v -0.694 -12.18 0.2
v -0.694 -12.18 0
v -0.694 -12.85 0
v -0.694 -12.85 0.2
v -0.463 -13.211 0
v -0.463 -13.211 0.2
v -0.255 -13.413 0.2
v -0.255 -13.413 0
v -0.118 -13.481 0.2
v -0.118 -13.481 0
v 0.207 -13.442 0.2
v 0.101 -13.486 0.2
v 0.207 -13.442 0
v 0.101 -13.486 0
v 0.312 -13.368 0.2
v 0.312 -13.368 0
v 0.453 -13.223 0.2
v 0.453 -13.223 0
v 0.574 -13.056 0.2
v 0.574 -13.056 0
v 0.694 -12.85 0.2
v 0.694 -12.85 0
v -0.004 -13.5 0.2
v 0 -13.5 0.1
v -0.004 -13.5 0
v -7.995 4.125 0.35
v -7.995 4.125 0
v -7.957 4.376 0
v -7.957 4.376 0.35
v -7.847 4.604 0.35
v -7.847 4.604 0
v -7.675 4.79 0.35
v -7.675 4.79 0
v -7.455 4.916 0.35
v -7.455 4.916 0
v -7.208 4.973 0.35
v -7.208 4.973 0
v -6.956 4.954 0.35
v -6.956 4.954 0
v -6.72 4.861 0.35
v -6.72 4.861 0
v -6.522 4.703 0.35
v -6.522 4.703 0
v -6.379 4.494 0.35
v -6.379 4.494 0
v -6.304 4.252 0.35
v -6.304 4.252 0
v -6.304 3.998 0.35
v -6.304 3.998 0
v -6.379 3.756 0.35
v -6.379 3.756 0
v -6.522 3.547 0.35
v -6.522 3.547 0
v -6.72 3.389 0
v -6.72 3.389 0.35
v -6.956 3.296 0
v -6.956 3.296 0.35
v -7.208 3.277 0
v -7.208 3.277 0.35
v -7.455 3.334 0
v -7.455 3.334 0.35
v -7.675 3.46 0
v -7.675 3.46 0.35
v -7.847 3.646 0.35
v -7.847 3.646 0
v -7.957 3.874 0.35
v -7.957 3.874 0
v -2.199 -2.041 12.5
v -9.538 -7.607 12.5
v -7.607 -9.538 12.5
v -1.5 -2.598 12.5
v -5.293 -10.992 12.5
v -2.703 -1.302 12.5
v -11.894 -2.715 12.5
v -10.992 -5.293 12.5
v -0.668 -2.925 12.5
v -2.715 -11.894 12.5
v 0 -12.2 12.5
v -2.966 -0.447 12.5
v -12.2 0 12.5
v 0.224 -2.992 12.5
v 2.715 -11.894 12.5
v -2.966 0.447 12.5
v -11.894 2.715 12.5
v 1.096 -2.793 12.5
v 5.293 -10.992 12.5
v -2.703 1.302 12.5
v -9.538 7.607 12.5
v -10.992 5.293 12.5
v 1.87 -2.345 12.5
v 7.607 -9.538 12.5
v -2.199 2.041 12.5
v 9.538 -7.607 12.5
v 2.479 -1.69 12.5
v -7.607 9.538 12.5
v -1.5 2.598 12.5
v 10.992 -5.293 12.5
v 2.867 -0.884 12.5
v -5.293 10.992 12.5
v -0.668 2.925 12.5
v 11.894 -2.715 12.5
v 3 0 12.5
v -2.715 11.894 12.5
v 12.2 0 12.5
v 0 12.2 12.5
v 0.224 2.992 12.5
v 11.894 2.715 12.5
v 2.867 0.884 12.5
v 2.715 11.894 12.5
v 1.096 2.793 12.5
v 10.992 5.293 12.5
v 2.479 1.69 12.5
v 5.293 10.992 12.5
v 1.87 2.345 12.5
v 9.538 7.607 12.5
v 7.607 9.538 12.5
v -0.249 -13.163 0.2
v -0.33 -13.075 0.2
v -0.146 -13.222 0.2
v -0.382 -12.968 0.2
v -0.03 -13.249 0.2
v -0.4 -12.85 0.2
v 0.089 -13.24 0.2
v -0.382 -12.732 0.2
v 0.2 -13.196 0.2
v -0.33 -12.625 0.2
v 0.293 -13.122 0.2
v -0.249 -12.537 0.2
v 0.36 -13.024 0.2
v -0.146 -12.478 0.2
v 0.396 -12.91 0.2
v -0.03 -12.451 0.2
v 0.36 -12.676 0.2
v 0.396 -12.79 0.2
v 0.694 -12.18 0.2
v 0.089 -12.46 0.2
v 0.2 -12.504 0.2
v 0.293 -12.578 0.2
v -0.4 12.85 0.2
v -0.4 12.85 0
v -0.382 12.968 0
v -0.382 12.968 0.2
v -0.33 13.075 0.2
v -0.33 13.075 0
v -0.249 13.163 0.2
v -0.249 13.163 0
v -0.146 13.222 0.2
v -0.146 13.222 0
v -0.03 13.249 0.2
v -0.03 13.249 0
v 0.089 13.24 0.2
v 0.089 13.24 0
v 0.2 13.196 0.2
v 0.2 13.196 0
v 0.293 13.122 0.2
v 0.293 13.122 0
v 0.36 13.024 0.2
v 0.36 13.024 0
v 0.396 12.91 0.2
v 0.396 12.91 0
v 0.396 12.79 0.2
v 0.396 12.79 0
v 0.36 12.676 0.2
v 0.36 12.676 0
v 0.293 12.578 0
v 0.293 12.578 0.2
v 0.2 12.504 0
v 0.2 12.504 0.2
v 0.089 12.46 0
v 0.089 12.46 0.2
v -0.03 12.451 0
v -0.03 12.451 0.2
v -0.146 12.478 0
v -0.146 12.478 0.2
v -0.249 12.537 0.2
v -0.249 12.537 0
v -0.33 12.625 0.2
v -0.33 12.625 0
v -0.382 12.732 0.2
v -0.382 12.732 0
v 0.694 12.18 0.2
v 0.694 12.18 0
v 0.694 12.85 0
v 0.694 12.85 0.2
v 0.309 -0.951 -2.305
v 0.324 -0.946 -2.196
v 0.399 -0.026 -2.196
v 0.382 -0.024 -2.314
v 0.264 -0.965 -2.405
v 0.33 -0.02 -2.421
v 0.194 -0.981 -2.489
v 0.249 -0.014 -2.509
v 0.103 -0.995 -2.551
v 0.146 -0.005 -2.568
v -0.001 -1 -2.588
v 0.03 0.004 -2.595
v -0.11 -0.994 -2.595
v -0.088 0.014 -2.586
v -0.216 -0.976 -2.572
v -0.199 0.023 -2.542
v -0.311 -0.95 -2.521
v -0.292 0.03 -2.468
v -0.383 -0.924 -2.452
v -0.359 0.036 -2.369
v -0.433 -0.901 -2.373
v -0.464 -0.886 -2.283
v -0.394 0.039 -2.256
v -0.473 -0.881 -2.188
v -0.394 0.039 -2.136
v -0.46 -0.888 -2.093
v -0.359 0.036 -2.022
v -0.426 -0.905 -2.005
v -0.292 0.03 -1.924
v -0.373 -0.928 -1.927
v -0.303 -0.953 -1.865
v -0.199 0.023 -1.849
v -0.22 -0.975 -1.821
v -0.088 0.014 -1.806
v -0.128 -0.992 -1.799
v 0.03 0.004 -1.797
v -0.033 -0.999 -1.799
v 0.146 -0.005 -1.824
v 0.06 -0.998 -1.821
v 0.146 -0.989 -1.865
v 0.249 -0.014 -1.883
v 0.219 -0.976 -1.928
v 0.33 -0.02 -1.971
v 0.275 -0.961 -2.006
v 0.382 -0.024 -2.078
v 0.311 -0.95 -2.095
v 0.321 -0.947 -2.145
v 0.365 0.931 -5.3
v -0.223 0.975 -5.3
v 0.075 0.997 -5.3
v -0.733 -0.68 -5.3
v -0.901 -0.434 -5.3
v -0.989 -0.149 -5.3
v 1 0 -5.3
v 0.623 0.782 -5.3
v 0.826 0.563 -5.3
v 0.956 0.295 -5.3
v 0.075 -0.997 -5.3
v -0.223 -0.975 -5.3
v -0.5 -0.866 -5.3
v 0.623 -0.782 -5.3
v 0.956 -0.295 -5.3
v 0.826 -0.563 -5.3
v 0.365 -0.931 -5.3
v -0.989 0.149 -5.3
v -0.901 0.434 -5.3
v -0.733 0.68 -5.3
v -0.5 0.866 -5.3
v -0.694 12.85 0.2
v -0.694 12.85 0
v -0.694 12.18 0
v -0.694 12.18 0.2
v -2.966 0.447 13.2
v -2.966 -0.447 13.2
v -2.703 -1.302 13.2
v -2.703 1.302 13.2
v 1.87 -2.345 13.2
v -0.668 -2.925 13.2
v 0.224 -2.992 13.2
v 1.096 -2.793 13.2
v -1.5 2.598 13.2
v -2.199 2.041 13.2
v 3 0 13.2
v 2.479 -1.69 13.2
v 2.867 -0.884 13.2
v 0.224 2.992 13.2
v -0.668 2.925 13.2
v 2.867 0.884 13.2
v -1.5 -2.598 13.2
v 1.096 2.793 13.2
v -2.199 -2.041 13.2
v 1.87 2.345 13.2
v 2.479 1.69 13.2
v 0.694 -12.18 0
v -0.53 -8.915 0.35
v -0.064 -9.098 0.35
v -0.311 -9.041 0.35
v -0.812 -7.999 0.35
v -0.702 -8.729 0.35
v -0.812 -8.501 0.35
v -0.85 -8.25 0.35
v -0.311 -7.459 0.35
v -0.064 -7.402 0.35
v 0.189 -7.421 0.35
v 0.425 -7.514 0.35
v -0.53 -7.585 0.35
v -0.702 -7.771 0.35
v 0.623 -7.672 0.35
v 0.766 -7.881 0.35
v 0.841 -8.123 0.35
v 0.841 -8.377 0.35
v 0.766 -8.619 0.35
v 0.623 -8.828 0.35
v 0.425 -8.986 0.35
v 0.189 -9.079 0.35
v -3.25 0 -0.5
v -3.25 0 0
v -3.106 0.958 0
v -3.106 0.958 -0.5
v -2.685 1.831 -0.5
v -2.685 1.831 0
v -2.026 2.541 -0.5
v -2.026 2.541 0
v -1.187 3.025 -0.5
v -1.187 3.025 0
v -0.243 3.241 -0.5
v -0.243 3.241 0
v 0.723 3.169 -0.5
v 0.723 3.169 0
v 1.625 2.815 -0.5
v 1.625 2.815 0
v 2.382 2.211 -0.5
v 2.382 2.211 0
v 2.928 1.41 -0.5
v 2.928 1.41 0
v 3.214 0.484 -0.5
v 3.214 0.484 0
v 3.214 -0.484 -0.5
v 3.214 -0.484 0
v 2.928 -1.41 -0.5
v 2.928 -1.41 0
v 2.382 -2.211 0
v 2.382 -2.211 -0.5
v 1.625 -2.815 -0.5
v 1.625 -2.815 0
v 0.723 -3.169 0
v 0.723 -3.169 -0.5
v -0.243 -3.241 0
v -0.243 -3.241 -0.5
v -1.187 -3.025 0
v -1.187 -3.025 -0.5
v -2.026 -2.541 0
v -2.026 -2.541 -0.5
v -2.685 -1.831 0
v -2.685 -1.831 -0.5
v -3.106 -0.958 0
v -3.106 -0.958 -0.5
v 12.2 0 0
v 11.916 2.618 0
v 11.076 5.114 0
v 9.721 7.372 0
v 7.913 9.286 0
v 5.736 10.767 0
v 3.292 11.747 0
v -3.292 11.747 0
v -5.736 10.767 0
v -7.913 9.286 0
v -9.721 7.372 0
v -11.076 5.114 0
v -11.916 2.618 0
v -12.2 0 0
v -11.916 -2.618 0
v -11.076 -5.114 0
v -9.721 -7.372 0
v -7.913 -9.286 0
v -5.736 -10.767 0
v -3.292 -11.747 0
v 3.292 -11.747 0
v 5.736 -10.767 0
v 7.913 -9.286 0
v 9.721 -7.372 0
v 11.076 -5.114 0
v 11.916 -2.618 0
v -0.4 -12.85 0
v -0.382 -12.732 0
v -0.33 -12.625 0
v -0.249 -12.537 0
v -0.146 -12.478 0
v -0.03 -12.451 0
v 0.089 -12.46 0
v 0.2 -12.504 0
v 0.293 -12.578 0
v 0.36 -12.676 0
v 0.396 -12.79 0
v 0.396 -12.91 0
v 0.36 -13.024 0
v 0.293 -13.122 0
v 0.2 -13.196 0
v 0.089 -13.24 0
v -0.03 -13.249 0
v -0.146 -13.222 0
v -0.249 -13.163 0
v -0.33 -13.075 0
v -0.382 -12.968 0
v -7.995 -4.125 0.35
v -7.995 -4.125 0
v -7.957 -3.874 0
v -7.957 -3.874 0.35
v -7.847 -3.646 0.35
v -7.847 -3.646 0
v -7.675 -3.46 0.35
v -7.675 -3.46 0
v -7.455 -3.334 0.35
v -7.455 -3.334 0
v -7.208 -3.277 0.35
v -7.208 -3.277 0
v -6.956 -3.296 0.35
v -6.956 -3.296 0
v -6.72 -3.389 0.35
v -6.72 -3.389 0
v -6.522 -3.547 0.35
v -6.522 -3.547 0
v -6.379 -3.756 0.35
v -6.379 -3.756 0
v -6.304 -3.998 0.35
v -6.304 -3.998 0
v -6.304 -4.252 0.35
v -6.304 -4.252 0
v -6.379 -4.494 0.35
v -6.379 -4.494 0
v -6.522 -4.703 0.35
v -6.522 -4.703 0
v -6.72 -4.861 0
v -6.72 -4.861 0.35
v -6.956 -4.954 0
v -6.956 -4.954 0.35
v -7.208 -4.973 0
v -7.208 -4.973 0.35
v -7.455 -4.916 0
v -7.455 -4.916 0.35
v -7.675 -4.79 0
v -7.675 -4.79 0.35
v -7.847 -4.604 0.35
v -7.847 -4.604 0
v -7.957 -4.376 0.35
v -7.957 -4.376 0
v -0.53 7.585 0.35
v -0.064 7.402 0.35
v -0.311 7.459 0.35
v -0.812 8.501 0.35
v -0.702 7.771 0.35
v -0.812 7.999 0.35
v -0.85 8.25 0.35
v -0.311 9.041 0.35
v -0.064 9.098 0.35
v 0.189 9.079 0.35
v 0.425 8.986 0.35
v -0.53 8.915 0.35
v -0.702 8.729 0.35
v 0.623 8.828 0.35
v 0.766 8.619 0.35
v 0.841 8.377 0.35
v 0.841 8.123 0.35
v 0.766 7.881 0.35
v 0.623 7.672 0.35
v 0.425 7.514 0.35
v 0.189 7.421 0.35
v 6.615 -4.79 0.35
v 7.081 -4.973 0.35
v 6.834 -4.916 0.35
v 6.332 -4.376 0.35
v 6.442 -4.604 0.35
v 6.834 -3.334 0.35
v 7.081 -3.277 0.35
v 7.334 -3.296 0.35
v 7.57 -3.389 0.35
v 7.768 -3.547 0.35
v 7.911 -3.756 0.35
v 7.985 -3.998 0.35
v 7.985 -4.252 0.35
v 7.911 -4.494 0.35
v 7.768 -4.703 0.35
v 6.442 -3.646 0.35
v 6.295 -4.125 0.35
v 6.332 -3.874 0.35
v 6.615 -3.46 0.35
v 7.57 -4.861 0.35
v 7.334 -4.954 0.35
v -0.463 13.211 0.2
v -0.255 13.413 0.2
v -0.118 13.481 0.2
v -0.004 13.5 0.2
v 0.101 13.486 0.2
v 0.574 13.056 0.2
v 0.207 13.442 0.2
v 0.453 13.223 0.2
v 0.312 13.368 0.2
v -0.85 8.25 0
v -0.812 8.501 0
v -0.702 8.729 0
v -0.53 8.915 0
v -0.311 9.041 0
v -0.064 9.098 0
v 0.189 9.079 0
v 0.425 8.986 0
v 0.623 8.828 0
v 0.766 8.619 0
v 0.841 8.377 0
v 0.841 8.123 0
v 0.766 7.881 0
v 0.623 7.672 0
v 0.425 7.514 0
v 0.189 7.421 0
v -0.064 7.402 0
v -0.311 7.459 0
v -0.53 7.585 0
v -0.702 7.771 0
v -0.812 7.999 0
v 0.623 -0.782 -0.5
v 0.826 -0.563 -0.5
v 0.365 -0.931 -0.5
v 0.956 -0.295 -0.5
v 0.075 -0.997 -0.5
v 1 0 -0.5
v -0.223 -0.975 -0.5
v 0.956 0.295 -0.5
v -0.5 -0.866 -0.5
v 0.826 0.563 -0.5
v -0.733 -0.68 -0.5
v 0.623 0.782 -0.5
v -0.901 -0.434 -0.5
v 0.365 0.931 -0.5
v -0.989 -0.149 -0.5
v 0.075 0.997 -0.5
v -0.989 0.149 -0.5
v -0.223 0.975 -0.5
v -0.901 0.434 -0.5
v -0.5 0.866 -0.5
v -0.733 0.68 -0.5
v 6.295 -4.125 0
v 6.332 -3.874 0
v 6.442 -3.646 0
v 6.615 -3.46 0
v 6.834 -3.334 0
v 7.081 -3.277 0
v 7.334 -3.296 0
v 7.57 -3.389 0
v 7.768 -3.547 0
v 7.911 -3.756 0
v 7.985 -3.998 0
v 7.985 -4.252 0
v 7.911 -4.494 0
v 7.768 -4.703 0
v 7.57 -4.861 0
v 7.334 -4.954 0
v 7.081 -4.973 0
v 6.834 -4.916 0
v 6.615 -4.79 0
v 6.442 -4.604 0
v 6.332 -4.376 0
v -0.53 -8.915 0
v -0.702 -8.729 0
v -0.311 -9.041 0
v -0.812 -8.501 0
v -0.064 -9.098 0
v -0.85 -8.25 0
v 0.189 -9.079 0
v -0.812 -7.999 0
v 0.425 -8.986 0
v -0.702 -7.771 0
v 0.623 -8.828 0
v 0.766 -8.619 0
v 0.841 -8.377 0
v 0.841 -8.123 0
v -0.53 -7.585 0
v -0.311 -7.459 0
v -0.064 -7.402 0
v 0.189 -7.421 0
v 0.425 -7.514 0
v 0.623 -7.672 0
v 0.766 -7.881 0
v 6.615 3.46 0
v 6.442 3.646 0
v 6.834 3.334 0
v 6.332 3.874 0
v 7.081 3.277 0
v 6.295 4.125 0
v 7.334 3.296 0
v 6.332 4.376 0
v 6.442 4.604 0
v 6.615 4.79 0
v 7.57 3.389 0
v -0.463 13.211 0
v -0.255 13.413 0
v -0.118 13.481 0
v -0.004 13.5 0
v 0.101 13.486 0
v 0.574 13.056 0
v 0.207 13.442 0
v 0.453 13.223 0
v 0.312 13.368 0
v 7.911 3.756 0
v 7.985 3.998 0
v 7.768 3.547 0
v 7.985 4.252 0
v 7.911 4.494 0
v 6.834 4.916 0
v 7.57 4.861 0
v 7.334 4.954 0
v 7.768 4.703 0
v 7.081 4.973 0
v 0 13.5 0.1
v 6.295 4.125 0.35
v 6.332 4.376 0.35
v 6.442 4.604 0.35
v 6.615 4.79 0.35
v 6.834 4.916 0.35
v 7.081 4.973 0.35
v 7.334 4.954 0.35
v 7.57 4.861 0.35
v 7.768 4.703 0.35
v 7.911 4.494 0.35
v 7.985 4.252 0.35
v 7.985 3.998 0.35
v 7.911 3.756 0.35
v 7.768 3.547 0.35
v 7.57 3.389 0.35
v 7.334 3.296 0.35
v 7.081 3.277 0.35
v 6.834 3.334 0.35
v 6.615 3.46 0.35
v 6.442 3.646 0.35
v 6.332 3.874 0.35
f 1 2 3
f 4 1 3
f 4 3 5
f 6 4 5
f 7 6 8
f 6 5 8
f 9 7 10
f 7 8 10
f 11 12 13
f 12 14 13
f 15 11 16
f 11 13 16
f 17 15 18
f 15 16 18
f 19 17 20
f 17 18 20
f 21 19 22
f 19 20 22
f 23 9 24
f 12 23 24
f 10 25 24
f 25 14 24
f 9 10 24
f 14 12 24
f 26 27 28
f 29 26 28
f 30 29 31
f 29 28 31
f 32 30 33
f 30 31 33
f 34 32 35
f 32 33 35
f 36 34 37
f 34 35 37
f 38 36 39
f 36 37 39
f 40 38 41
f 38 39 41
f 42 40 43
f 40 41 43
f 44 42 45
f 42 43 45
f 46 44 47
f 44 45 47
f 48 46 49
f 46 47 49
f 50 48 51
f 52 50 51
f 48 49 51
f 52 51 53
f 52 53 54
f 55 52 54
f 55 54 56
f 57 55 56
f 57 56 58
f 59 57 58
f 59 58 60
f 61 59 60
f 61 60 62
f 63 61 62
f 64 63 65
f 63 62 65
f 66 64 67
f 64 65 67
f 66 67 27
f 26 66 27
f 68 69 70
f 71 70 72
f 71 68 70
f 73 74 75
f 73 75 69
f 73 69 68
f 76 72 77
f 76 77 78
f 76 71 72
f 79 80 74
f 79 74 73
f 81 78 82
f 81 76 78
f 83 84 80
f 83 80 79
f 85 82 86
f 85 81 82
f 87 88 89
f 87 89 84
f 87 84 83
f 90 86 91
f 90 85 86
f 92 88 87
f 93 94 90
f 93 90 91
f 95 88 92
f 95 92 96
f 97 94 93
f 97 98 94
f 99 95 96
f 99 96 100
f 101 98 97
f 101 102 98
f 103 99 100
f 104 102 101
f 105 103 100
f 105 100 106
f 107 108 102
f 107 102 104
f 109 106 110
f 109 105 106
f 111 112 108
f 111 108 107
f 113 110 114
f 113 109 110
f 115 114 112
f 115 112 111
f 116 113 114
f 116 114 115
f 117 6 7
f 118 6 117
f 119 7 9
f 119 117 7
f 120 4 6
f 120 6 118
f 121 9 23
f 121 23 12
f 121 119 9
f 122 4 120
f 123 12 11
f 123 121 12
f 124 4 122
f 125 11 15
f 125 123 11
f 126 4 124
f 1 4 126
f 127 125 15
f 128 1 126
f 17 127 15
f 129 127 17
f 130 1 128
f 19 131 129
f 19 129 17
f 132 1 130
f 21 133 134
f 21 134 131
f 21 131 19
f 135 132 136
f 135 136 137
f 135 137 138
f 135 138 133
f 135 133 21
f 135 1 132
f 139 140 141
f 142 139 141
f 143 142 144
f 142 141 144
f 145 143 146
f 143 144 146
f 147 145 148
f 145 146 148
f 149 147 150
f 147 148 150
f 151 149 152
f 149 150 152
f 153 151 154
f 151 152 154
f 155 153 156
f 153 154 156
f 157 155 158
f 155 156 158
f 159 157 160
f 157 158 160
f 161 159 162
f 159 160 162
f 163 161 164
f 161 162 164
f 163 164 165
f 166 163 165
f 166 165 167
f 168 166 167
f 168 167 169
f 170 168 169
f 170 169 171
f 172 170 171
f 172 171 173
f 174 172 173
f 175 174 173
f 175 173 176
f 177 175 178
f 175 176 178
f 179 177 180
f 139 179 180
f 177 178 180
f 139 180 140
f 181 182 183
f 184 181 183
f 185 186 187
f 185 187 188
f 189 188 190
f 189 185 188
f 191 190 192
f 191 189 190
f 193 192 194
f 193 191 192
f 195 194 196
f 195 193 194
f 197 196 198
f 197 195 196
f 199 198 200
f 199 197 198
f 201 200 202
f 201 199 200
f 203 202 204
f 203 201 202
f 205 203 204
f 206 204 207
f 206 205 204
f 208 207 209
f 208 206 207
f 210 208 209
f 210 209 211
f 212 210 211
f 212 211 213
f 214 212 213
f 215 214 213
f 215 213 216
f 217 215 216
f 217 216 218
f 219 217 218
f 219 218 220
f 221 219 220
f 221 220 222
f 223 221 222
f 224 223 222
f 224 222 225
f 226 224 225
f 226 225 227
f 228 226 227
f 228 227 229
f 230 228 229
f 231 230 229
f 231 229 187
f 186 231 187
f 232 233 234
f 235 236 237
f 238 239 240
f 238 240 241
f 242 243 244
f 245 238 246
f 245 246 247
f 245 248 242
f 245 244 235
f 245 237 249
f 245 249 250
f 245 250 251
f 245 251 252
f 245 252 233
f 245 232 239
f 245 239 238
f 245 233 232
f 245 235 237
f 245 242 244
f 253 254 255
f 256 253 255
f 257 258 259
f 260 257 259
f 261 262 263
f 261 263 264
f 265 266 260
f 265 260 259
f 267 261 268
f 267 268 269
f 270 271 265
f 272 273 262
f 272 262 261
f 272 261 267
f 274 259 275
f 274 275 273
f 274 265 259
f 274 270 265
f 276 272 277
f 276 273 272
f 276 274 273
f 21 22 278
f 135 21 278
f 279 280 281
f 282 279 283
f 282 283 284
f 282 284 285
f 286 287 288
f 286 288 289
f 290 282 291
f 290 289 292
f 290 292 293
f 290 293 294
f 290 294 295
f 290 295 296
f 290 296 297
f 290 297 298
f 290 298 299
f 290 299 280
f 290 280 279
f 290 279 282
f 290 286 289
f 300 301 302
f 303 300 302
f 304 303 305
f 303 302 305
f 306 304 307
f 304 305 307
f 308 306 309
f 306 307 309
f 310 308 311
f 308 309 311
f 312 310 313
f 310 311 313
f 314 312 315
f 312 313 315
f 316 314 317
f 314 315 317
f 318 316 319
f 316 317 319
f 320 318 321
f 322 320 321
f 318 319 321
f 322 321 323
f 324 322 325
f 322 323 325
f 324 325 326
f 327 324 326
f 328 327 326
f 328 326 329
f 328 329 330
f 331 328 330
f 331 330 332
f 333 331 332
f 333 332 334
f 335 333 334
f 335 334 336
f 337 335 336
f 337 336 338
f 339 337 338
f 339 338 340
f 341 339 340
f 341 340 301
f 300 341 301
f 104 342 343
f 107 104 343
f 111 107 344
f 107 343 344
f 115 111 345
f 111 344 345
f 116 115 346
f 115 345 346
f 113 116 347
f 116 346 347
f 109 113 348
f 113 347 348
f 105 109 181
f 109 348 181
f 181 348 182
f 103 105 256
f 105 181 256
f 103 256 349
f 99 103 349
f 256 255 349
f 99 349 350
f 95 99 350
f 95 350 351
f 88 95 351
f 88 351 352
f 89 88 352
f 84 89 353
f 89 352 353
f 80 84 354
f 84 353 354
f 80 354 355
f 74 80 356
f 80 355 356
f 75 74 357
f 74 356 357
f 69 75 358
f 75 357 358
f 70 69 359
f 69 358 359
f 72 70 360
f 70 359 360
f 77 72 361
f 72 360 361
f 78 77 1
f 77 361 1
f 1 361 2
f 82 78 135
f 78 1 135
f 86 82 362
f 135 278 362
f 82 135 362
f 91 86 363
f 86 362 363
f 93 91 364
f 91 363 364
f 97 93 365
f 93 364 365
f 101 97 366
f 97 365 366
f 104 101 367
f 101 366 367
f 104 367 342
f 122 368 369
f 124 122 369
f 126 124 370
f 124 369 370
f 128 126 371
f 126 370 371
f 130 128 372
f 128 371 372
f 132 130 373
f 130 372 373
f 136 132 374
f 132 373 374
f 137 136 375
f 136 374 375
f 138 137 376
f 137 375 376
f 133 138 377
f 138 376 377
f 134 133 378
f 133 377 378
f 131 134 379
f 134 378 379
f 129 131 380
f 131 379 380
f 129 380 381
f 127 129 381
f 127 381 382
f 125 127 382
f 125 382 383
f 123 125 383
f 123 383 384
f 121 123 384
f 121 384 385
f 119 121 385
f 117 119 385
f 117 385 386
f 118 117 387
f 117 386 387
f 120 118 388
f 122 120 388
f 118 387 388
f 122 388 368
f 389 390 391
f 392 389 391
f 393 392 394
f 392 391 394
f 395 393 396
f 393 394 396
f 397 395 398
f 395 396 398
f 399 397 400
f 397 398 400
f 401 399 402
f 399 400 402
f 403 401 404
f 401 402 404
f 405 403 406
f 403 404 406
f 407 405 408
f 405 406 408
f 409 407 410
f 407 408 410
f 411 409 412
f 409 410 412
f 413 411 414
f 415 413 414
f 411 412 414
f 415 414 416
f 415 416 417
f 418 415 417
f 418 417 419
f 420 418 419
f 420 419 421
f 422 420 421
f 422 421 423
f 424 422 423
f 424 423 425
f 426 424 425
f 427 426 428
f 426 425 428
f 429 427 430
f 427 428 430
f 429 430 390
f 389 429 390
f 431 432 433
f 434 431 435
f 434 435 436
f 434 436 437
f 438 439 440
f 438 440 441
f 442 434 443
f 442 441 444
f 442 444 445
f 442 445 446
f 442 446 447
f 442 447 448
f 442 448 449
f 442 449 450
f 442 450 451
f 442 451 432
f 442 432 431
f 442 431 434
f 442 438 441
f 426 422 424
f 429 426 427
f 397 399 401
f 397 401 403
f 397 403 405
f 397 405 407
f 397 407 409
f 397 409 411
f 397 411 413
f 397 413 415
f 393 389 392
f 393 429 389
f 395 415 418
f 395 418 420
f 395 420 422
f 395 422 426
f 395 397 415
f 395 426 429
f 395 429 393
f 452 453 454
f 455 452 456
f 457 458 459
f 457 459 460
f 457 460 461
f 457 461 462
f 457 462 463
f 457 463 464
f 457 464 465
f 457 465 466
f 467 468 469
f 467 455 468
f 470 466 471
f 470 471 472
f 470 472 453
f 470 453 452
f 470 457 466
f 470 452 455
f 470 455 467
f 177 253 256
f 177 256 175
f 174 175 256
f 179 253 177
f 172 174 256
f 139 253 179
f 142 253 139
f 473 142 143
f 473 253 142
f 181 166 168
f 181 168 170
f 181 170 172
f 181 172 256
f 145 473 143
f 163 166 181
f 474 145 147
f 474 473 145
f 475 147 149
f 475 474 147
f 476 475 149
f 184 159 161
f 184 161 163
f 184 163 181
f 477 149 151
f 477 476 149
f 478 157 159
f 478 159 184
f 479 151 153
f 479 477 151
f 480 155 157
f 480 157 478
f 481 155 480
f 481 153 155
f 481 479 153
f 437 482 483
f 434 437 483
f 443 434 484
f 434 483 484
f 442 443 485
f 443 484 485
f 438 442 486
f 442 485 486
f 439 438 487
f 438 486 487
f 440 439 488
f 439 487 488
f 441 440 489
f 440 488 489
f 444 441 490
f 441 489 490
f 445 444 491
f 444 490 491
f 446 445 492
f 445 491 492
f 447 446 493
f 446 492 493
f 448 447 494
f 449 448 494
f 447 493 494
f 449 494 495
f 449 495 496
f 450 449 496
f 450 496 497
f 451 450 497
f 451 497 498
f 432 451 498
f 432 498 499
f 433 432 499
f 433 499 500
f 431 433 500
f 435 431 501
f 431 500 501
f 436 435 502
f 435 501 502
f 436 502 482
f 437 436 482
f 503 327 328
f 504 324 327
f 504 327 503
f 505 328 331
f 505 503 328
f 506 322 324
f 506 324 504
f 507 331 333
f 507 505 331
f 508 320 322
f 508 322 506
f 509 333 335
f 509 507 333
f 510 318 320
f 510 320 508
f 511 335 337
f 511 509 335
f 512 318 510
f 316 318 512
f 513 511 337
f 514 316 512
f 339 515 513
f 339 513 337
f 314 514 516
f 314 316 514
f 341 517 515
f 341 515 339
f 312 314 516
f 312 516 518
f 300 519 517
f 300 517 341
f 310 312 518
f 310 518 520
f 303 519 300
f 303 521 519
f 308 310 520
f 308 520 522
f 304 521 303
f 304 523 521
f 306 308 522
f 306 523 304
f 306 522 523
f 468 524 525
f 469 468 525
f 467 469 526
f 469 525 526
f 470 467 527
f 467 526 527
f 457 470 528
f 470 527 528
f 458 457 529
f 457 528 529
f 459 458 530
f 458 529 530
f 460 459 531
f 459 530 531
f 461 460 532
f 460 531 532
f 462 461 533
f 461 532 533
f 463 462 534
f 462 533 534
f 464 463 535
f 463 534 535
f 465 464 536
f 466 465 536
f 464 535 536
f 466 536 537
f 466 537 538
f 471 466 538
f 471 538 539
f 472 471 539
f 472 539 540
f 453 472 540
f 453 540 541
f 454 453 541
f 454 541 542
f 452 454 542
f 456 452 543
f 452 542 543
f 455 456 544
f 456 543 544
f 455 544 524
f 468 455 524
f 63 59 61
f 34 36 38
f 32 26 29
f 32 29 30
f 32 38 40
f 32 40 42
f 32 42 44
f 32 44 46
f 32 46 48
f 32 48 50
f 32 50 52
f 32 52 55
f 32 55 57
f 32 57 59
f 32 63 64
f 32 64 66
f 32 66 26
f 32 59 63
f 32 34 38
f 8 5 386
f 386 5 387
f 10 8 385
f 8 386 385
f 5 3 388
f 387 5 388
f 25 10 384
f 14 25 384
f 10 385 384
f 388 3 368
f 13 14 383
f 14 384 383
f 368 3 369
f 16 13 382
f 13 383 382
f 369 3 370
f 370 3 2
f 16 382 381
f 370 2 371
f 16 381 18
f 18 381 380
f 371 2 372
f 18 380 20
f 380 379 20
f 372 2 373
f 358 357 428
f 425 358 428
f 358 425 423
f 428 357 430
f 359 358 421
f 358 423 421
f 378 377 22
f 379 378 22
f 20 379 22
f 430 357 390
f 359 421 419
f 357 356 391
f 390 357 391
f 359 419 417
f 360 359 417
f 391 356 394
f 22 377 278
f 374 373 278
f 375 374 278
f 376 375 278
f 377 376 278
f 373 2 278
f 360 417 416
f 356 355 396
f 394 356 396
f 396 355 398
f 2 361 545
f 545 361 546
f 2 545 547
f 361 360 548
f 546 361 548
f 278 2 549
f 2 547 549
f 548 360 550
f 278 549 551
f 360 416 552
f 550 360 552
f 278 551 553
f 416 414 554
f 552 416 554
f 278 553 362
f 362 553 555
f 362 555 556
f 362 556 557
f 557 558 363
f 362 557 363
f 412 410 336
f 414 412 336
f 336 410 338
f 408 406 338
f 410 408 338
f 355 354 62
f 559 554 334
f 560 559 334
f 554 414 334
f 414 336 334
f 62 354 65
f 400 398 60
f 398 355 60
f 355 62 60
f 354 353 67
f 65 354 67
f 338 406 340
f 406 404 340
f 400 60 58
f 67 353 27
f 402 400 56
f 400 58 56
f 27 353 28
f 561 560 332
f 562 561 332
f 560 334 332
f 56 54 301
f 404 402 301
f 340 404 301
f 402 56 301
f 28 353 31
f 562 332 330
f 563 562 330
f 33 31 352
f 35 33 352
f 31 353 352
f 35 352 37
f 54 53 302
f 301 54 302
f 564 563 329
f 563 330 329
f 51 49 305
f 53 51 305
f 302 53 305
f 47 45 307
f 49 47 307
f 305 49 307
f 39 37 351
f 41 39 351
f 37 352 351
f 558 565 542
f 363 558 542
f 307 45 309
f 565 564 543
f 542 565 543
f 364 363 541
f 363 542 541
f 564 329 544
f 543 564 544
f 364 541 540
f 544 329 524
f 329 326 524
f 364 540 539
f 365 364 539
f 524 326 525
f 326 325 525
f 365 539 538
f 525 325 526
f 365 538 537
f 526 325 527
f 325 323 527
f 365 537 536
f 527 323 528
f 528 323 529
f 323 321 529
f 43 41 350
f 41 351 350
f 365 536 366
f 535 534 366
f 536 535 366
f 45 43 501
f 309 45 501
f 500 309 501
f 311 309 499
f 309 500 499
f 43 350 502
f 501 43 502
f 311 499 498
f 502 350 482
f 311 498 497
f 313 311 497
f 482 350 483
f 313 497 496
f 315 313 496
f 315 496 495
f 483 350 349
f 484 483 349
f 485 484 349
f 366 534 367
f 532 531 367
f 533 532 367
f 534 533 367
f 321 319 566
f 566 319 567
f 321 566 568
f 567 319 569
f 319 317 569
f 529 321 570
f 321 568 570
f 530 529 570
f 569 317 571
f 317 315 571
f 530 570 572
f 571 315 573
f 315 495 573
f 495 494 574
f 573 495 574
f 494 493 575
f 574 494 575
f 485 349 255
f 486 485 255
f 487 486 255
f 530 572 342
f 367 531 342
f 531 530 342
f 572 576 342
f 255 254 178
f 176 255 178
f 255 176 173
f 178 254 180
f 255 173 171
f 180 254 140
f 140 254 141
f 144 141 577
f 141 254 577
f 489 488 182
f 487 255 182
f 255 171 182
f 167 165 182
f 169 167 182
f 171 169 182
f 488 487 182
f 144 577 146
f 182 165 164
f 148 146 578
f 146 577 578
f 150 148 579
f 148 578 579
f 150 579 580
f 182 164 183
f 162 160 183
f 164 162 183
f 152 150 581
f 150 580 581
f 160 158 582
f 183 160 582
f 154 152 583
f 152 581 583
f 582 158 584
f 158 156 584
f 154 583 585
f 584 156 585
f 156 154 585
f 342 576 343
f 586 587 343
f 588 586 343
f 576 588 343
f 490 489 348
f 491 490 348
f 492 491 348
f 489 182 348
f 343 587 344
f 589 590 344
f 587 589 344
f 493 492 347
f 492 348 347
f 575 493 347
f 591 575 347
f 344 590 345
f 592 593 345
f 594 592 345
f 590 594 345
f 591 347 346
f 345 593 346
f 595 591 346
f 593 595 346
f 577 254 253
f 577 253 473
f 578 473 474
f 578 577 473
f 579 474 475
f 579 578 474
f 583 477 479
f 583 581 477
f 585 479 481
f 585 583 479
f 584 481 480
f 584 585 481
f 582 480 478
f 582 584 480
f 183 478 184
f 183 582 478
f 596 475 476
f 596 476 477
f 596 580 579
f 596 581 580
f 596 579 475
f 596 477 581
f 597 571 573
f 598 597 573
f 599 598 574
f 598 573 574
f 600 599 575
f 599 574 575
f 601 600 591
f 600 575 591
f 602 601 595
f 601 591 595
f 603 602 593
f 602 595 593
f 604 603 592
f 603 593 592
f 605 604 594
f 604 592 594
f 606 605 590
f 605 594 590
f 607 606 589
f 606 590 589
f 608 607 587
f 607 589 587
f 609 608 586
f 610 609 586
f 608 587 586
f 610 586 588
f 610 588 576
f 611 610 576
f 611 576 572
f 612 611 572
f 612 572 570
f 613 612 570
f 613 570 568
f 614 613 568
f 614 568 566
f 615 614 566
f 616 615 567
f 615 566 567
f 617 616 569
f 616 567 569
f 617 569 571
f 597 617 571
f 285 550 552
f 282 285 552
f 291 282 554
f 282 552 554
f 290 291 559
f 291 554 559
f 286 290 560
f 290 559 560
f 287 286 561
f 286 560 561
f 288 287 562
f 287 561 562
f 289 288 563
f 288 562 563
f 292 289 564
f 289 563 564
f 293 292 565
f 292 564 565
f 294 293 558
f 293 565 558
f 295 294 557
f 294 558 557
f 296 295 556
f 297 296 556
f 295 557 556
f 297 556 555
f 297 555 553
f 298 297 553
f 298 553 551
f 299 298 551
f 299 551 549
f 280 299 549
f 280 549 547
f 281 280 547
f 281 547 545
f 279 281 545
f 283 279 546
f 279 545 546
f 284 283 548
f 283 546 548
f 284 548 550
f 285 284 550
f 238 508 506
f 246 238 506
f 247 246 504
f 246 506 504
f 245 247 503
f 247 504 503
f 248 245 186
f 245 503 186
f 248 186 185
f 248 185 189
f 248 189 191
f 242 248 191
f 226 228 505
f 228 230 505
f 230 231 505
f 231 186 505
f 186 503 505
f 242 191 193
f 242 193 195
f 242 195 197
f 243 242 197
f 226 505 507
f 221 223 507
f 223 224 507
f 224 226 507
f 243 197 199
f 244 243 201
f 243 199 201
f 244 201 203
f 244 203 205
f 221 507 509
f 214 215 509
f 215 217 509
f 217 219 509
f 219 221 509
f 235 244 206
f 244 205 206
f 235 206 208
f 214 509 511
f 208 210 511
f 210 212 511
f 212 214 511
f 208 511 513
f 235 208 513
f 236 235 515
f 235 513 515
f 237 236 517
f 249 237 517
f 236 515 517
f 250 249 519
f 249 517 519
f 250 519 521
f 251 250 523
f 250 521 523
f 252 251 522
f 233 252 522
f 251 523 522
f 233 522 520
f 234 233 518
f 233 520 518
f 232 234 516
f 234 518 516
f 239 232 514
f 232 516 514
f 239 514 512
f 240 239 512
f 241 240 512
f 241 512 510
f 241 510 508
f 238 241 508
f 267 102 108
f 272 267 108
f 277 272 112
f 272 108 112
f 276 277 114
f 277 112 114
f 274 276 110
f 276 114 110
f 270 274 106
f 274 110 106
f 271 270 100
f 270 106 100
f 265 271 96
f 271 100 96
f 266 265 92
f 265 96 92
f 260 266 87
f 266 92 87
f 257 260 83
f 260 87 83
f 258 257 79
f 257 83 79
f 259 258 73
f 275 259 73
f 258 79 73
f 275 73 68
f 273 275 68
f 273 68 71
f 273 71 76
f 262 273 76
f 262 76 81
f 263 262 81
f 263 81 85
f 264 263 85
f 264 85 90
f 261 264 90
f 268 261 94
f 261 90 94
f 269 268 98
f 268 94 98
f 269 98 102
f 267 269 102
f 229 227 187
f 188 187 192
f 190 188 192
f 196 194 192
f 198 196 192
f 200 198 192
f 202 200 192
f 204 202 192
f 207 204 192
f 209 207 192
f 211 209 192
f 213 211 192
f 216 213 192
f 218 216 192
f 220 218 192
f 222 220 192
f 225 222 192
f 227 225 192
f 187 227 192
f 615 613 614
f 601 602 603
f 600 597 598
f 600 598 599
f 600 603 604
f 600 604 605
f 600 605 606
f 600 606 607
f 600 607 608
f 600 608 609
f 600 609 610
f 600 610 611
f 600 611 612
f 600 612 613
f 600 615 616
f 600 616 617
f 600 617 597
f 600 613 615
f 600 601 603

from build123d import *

# Parameters (mm, degrees)
SKETCH_1_R               = 12.2
EXTRUDE_1_DEPTH          = 12.5
SKETCH_2_R               = 3
EXTRUDE_2_DEPTH          = 0.7
SKETCH_3_R               = 3.25
EXTRUDE_3_DEPTH          = 1
SKETCH_4_R               = 1
EXTRUDE_4_DEPTH          = 4.3
SKETCH_5_R               = 0.85
CUT_EXTRUDE_1_DEPTH      = 0.35
CUT_EXTRUDE_START        = -0.5
SKETCH_6_R               = 3.25
SKETCH_6_R_2             = 1
CUT_EXTRUDE_2_DEPTH      = 0.5
SKETCH_8_R               = 0.4
EXTRUDE_6_DEPTH          = 0.2
CUT_EXTRUDE_3_DEPTH      = 2
CUT_EXTRUDE_3_DEPTH_BACK = 1.1
SKETCH_9_R               = 0.4


with BuildPart() as part:
    # 草图1 → 凸台-拉伸1 (new body)
    with BuildSketch(Plane.XY):
        Circle(SKETCH_1_R)
    extrude(amount=EXTRUDE_1_DEPTH)

    # 草图2 → 凸台-拉伸2 (add)
    with BuildSketch(Plane.XY.offset(12.5)):
        Circle(SKETCH_2_R)
    extrude(amount=EXTRUDE_2_DEPTH)

    # 草图3 → 凸台-拉伸3 (add)
    with BuildSketch(Plane(origin=(0, 0, 0), x_dir=(-1, 0, 0), z_dir=(0, 0, -1))):
        Circle(SKETCH_3_R)
    extrude(amount=EXTRUDE_3_DEPTH)

    # 草图4 → 凸台-拉伸4 (add)
    with BuildSketch(Plane(origin=(0, 0, -1), x_dir=(-1, 0, 0), z_dir=(0, 0, -1))):
        with Locations(Location((0, 0, 0), (0, 0, 180))):
            Circle(SKETCH_4_R)
    extrude(amount=EXTRUDE_4_DEPTH)

    # 草图5 → 切除-拉伸1 (cut)
    with BuildSketch(Plane(origin=(0, 0, 0), x_dir=(-1, 0, 0), z_dir=(0, 0, -1))):
        with Locations((0, 8.25)):
            Circle(SKETCH_5_R)
        with Locations((7.144709581, 4.125)):
            Circle(SKETCH_5_R)
        with Locations((7.144709581, -4.125)):
            Circle(SKETCH_5_R)
        with Locations((0, -8.25)):
            Circle(SKETCH_5_R)
        with Locations((-7.144709581, -4.125)):
            Circle(SKETCH_5_R)
        with Locations((-7.144709581, 4.125)):
            Circle(SKETCH_5_R)
    extrude(amount=-CUT_EXTRUDE_1_DEPTH, mode=Mode.SUBTRACT)

    # 草图6 → 切除-拉伸2 (cut)
    with BuildSketch(Plane(origin=(0, 0, -1), x_dir=(-1, 0, 0), z_dir=(0, 0, -1)).offset(CUT_EXTRUDE_START)):
        Circle(SKETCH_6_R)
        with Locations(Location((0, 0, 0), (0, 0, 180))):
            Circle(SKETCH_6_R_2, mode=Mode.SUBTRACT)
    extrude(amount=CUT_EXTRUDE_2_DEPTH, mode=Mode.SUBTRACT)

    # 草图8 → 凸台-拉伸6 (add)
    # profile 1 of 2: a face of its own
    with BuildSketch(Plane(origin=(0, 0, 0), x_dir=(-1, 0, 0), z_dir=(0, 0, -1))):
        with BuildLine():
            Line((0.694469448, 12.85), (0.694469448, 12.180218068))
            add(Edge.make_bspline(
                [(0.694469448, 12.180218068), (0, 12.219781932), (-0.694469448, 12.180218068)],
                knots=[0, 0, 0, 1, 1, 1], degree=2))
            Line((-0.694469448, 12.180218068), (-0.694469448, 12.85))
            add(Edge.make_bspline(
                [(0.694469448, 12.85), (0, 14.15), (-0.694469448, 12.85)],
                knots=[0, 0, 0, 1, 1, 1], degree=2))
        make_face()
        with Locations((0, 12.85)):
            Circle(SKETCH_8_R, mode=Mode.SUBTRACT)
    # profile 2 of 2: a face of its own
    with BuildSketch(Plane(origin=(0, 0, 0), x_dir=(-1, 0, 0), z_dir=(0, 0, -1))):
        with BuildLine():
            Line((-0.694469448, -12.85), (-0.694469448, -12.180218068))
            add(Edge.make_bspline(
                [(0.694469448, -12.180218068), (0, -12.219781932), (-0.694469448, -12.180218068)],
                knots=[0, 0, 0, 1, 1, 1], degree=2))
            Line((0.694469448, -12.180218068), (0.694469448, -12.85))
            add(Edge.make_bspline(
                [(0.694469448, -12.85), (0, -14.15), (-0.694469448, -12.85)],
                knots=[0, 0, 0, 1, 1, 1], degree=2))
        make_face()
        with Locations((0, -12.85)):
            Circle(SKETCH_8_R, mode=Mode.SUBTRACT)
    extrude(amount=-EXTRUDE_6_DEPTH)

    # 草图9 → 切除-拉伸3 (cut, two sides: drawn at the far end of the back side and taken through both)
    with BuildSketch(Plane(origin=(-65.68529626, 3.340628685, 41.676272609), x_dir=(0, 0, -1), z_dir=(0.08103812035682426, 0.9967110027731373, 1.0147062402532315e-14)).offset(-CUT_EXTRUDE_3_DEPTH_BACK)):
        with Locations(Location((43.872176256, -65.74, 0), (0, 0, 270))):
            Circle(SKETCH_9_R)
    extrude(amount=CUT_EXTRUDE_3_DEPTH + CUT_EXTRUDE_3_DEPTH_BACK, mode=Mode.SUBTRACT)


solid = part.part
